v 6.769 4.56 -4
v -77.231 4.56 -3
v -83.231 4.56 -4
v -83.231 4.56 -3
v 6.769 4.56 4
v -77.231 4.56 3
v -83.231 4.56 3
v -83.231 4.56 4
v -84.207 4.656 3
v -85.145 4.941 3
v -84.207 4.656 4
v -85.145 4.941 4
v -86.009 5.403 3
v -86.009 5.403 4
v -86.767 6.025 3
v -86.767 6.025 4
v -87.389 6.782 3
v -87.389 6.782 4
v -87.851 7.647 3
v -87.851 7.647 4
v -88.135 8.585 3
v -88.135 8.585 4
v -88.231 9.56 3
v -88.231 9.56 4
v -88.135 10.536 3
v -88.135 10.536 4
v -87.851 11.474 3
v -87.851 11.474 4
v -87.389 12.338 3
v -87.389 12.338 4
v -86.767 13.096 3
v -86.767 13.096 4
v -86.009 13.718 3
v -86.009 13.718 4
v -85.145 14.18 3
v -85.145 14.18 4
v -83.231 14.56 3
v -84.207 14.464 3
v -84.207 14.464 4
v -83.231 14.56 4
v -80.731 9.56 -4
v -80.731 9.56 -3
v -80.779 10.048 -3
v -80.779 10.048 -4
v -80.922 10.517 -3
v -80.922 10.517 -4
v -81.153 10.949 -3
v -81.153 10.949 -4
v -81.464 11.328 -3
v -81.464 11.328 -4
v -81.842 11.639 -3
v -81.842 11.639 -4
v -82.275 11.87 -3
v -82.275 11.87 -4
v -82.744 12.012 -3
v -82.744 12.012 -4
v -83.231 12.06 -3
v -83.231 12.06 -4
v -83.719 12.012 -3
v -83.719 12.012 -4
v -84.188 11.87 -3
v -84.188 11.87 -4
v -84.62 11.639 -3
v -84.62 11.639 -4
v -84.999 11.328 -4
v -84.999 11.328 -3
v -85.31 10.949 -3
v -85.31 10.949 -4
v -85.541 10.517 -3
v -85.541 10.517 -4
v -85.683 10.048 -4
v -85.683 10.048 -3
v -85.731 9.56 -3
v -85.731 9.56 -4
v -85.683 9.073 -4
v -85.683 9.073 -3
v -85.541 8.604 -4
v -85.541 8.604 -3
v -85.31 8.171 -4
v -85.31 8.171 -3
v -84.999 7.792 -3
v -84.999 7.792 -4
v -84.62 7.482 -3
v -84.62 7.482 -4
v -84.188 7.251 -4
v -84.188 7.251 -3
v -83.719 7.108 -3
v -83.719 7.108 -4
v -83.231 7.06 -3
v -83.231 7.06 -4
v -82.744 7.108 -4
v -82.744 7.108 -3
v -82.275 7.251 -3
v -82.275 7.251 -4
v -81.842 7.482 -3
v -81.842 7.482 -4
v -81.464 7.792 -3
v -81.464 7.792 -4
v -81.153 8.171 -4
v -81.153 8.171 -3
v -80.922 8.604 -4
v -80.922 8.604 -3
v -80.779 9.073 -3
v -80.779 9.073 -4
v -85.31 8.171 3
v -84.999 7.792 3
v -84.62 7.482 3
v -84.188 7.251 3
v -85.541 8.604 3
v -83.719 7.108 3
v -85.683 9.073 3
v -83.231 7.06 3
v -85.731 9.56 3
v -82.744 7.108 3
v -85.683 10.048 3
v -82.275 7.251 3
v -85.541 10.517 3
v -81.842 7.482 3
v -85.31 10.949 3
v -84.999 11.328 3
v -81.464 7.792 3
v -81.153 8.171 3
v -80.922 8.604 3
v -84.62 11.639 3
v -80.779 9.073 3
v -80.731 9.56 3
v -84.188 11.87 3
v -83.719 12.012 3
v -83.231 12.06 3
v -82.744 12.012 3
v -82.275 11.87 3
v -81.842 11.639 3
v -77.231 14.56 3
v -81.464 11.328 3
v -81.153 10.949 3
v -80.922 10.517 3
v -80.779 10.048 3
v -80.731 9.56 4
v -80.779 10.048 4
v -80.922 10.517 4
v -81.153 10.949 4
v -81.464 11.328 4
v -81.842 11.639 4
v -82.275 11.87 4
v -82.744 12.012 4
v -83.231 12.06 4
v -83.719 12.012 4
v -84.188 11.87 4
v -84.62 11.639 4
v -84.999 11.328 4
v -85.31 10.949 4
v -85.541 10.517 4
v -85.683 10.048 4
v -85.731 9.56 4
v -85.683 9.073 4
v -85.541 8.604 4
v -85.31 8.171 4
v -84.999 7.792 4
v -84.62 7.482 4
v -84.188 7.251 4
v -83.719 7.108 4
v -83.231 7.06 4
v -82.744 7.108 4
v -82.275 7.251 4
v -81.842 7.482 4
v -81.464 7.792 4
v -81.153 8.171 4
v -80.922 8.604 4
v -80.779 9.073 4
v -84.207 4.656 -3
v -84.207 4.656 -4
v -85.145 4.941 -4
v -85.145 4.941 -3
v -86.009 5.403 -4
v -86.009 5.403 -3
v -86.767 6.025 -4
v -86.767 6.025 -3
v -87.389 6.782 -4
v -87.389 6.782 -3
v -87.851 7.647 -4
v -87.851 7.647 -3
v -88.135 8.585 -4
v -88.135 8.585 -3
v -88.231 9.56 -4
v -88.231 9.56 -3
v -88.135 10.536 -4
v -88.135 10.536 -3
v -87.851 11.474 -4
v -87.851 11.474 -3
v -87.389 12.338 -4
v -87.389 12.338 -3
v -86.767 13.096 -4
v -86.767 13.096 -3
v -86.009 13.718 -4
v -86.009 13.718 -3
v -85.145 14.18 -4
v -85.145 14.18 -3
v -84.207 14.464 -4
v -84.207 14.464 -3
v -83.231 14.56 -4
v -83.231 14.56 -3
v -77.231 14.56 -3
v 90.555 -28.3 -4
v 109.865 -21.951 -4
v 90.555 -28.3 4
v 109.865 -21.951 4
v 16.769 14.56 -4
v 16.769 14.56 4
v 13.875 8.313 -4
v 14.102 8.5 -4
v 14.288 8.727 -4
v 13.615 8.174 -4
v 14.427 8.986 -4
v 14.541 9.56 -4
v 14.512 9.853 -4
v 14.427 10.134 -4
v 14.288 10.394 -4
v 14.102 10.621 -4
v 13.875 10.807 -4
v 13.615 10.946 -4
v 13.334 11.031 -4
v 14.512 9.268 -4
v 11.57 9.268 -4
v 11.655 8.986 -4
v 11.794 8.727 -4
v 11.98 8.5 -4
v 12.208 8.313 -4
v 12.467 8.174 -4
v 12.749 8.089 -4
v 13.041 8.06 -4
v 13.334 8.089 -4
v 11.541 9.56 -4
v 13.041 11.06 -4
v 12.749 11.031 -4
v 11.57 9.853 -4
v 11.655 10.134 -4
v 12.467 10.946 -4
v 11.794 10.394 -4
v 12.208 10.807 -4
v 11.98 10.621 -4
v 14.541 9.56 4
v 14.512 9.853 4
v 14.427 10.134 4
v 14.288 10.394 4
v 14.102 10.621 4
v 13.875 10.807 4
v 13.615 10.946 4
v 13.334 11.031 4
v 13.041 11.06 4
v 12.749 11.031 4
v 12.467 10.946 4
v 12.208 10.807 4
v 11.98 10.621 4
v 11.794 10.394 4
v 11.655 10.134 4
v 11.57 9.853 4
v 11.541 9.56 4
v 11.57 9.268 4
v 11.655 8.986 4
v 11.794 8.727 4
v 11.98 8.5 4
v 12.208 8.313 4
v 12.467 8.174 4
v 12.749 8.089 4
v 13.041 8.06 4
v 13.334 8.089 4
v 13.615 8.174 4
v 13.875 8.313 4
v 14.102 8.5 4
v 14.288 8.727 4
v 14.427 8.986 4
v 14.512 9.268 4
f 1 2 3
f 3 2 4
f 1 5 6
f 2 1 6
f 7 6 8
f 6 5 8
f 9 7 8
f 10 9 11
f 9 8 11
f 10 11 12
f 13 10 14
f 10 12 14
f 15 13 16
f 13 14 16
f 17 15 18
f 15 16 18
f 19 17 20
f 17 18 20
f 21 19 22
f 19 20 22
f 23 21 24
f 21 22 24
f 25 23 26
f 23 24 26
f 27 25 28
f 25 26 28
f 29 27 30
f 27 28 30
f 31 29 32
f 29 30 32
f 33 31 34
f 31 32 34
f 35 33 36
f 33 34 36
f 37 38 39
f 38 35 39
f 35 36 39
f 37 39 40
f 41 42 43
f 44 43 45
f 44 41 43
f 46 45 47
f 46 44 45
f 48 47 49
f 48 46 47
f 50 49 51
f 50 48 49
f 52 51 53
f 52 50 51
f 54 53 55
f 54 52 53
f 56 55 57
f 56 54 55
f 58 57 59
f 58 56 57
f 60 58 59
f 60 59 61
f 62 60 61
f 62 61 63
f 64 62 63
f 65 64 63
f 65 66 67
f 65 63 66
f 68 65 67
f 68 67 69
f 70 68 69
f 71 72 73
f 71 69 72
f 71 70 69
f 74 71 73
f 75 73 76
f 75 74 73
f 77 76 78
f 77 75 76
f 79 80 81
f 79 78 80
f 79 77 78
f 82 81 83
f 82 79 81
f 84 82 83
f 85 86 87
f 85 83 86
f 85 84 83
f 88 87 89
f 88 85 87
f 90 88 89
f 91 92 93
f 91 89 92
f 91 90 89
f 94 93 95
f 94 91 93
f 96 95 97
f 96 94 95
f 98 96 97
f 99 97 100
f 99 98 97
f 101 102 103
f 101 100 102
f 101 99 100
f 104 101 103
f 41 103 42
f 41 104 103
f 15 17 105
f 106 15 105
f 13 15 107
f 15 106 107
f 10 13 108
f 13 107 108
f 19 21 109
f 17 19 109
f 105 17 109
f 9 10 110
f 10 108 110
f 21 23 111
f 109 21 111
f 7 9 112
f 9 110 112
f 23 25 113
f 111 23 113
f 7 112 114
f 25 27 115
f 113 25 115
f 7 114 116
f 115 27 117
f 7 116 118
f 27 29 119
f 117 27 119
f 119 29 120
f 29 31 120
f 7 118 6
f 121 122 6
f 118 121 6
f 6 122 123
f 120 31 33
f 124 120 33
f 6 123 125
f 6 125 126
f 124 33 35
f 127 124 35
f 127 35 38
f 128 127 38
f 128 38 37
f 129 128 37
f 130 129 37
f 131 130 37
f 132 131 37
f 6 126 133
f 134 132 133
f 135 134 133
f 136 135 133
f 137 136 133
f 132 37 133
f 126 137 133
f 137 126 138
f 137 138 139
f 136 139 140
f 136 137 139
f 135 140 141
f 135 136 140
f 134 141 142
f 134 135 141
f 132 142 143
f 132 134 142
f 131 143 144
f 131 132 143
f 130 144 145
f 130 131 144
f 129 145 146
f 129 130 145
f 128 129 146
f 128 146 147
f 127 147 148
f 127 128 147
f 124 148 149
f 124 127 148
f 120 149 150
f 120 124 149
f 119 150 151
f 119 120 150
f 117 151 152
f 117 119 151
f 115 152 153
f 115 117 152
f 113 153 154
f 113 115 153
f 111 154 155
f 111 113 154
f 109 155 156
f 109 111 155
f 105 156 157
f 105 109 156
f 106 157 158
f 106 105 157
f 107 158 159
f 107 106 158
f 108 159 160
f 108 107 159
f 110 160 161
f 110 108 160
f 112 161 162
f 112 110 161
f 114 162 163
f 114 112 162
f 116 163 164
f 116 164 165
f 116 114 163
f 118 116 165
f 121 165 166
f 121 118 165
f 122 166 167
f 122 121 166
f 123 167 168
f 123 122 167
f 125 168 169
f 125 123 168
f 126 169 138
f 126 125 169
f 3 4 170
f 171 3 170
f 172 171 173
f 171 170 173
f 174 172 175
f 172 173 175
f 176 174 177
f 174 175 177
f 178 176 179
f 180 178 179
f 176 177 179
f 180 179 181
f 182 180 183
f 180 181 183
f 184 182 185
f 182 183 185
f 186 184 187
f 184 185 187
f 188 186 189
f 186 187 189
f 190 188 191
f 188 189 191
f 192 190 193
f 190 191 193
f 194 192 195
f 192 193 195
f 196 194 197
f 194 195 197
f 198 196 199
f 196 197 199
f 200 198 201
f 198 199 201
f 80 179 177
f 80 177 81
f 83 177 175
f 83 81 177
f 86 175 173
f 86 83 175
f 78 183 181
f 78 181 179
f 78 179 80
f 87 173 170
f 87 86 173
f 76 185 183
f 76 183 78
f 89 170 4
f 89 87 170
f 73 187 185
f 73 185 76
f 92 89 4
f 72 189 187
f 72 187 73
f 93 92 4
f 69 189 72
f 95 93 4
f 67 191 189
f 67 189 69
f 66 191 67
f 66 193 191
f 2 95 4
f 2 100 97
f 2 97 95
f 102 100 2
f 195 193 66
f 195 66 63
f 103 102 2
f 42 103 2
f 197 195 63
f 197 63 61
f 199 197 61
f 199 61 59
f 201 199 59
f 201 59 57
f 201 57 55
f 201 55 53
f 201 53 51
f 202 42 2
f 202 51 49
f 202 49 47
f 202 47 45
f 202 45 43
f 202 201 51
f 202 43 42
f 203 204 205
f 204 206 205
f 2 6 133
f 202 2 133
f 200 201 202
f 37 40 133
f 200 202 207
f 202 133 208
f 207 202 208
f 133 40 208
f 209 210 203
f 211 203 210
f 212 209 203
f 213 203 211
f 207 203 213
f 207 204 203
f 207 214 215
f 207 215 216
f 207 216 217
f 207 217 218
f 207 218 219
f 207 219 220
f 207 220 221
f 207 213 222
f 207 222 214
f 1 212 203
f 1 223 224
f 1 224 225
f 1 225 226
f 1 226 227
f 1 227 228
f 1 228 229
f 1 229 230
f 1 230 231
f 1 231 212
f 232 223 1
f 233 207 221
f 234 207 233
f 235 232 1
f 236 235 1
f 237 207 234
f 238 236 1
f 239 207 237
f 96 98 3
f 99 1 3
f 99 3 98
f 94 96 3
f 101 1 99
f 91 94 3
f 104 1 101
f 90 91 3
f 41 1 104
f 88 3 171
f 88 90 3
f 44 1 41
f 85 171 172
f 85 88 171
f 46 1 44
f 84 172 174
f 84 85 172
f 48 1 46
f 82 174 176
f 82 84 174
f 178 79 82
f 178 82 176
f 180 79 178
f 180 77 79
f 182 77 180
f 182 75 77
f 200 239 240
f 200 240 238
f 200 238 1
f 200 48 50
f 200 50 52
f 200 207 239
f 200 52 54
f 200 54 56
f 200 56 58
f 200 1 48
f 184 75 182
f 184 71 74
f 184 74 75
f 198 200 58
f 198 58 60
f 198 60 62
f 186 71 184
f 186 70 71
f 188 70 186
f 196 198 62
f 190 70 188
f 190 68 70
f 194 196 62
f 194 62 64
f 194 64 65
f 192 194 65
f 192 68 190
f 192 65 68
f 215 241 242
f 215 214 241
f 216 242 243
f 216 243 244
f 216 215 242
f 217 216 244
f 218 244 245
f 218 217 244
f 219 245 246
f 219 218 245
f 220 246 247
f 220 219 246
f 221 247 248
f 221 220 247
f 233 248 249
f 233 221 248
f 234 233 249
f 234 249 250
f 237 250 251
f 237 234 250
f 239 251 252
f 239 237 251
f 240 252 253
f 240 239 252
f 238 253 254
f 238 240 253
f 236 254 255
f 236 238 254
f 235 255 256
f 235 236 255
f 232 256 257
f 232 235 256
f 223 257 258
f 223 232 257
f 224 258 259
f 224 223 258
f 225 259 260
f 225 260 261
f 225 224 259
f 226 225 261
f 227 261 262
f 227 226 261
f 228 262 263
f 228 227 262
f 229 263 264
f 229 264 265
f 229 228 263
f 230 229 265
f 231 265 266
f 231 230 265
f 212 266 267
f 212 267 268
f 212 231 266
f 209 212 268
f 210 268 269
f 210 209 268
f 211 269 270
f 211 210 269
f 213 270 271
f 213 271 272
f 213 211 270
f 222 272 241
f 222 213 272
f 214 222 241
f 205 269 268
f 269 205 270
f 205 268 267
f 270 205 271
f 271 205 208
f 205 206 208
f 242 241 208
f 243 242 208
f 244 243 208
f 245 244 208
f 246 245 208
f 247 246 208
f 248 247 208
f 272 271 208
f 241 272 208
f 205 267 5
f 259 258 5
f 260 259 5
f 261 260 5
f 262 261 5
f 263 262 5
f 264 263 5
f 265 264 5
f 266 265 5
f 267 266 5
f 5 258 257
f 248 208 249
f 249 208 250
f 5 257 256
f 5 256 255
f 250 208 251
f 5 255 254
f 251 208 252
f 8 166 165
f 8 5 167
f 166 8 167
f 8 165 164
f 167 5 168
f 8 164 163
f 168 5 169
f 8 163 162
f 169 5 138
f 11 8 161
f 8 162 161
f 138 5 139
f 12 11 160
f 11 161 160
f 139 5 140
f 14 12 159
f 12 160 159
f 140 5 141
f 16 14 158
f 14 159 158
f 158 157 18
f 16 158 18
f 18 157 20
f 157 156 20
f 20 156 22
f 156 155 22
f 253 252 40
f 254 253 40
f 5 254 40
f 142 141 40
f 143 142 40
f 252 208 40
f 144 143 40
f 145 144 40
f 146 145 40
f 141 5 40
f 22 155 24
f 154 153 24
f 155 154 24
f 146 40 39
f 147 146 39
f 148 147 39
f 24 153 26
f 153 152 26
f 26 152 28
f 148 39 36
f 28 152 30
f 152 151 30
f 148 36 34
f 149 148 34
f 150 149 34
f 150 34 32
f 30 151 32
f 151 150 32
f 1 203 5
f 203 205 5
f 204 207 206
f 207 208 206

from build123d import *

# Parameters (mm, degrees)
SKETCH_1_R          = 2.5
SKETCH_1_R_2        = 1.5
EXTRUDE_2_DEPTH     = 4
CUT_EXTRUDE_1_DEPTH = 3


with BuildPart() as part:
    # 草图1 → 凸台-拉伸2 (new, symmetric)
    with BuildSketch(Plane.XY):
        with BuildLine():
            Line((-83.231357553, 14.560229446), (-43.231357553, 14.560229446))
            Line((-43.231357553, 14.560229446), (16.768642447, 14.560229446))
            Line((16.768642447, 14.560229446), (109.865069812, -21.95079919))
            Line((109.865069812, -21.95079919), (90.555427075, -28.299696326))
            Line((90.555427075, -28.299696326), (6.768642447, 4.560229446))
            Line((6.768642447, 4.560229446), (-43.231357553, 4.560229446))
            Line((-43.231357553, 4.560229446), (-83.231357553, 4.560229446))
            ThreePointArc((-83.231357553, 4.560229446), (-88.231357553, 9.560229446), (-83.231357553, 14.560229446))
        make_face()
        with Locations((-83.231357553, 9.560229446)):
            Circle(SKETCH_1_R, mode=Mode.SUBTRACT)
        with Locations((13.041147127, 9.560229446)):
            Circle(SKETCH_1_R_2, mode=Mode.SUBTRACT)
    extrude(amount=EXTRUDE_2_DEPTH, both=True)

    # 草图2 → 切除-拉伸1 (cut, symmetric)
    with BuildSketch(Plane.XY):
        with BuildLine():
            Line((-83.231357553, 4.560229446), (-77.231357553, 4.560229446))
            Line((-77.231357553, 4.560229446), (-77.231357553, 14.560229446))
            Line((-77.231357553, 14.560229446), (-83.231357553, 14.560229446))
            ThreePointArc((-83.231357553, 14.560229446), (-88.231357553, 9.560229446), (-83.231357553, 4.560229446))
        make_face()
    extrude(amount=CUT_EXTRUDE_1_DEPTH, both=True, mode=Mode.SUBTRACT)


solid = part.part
